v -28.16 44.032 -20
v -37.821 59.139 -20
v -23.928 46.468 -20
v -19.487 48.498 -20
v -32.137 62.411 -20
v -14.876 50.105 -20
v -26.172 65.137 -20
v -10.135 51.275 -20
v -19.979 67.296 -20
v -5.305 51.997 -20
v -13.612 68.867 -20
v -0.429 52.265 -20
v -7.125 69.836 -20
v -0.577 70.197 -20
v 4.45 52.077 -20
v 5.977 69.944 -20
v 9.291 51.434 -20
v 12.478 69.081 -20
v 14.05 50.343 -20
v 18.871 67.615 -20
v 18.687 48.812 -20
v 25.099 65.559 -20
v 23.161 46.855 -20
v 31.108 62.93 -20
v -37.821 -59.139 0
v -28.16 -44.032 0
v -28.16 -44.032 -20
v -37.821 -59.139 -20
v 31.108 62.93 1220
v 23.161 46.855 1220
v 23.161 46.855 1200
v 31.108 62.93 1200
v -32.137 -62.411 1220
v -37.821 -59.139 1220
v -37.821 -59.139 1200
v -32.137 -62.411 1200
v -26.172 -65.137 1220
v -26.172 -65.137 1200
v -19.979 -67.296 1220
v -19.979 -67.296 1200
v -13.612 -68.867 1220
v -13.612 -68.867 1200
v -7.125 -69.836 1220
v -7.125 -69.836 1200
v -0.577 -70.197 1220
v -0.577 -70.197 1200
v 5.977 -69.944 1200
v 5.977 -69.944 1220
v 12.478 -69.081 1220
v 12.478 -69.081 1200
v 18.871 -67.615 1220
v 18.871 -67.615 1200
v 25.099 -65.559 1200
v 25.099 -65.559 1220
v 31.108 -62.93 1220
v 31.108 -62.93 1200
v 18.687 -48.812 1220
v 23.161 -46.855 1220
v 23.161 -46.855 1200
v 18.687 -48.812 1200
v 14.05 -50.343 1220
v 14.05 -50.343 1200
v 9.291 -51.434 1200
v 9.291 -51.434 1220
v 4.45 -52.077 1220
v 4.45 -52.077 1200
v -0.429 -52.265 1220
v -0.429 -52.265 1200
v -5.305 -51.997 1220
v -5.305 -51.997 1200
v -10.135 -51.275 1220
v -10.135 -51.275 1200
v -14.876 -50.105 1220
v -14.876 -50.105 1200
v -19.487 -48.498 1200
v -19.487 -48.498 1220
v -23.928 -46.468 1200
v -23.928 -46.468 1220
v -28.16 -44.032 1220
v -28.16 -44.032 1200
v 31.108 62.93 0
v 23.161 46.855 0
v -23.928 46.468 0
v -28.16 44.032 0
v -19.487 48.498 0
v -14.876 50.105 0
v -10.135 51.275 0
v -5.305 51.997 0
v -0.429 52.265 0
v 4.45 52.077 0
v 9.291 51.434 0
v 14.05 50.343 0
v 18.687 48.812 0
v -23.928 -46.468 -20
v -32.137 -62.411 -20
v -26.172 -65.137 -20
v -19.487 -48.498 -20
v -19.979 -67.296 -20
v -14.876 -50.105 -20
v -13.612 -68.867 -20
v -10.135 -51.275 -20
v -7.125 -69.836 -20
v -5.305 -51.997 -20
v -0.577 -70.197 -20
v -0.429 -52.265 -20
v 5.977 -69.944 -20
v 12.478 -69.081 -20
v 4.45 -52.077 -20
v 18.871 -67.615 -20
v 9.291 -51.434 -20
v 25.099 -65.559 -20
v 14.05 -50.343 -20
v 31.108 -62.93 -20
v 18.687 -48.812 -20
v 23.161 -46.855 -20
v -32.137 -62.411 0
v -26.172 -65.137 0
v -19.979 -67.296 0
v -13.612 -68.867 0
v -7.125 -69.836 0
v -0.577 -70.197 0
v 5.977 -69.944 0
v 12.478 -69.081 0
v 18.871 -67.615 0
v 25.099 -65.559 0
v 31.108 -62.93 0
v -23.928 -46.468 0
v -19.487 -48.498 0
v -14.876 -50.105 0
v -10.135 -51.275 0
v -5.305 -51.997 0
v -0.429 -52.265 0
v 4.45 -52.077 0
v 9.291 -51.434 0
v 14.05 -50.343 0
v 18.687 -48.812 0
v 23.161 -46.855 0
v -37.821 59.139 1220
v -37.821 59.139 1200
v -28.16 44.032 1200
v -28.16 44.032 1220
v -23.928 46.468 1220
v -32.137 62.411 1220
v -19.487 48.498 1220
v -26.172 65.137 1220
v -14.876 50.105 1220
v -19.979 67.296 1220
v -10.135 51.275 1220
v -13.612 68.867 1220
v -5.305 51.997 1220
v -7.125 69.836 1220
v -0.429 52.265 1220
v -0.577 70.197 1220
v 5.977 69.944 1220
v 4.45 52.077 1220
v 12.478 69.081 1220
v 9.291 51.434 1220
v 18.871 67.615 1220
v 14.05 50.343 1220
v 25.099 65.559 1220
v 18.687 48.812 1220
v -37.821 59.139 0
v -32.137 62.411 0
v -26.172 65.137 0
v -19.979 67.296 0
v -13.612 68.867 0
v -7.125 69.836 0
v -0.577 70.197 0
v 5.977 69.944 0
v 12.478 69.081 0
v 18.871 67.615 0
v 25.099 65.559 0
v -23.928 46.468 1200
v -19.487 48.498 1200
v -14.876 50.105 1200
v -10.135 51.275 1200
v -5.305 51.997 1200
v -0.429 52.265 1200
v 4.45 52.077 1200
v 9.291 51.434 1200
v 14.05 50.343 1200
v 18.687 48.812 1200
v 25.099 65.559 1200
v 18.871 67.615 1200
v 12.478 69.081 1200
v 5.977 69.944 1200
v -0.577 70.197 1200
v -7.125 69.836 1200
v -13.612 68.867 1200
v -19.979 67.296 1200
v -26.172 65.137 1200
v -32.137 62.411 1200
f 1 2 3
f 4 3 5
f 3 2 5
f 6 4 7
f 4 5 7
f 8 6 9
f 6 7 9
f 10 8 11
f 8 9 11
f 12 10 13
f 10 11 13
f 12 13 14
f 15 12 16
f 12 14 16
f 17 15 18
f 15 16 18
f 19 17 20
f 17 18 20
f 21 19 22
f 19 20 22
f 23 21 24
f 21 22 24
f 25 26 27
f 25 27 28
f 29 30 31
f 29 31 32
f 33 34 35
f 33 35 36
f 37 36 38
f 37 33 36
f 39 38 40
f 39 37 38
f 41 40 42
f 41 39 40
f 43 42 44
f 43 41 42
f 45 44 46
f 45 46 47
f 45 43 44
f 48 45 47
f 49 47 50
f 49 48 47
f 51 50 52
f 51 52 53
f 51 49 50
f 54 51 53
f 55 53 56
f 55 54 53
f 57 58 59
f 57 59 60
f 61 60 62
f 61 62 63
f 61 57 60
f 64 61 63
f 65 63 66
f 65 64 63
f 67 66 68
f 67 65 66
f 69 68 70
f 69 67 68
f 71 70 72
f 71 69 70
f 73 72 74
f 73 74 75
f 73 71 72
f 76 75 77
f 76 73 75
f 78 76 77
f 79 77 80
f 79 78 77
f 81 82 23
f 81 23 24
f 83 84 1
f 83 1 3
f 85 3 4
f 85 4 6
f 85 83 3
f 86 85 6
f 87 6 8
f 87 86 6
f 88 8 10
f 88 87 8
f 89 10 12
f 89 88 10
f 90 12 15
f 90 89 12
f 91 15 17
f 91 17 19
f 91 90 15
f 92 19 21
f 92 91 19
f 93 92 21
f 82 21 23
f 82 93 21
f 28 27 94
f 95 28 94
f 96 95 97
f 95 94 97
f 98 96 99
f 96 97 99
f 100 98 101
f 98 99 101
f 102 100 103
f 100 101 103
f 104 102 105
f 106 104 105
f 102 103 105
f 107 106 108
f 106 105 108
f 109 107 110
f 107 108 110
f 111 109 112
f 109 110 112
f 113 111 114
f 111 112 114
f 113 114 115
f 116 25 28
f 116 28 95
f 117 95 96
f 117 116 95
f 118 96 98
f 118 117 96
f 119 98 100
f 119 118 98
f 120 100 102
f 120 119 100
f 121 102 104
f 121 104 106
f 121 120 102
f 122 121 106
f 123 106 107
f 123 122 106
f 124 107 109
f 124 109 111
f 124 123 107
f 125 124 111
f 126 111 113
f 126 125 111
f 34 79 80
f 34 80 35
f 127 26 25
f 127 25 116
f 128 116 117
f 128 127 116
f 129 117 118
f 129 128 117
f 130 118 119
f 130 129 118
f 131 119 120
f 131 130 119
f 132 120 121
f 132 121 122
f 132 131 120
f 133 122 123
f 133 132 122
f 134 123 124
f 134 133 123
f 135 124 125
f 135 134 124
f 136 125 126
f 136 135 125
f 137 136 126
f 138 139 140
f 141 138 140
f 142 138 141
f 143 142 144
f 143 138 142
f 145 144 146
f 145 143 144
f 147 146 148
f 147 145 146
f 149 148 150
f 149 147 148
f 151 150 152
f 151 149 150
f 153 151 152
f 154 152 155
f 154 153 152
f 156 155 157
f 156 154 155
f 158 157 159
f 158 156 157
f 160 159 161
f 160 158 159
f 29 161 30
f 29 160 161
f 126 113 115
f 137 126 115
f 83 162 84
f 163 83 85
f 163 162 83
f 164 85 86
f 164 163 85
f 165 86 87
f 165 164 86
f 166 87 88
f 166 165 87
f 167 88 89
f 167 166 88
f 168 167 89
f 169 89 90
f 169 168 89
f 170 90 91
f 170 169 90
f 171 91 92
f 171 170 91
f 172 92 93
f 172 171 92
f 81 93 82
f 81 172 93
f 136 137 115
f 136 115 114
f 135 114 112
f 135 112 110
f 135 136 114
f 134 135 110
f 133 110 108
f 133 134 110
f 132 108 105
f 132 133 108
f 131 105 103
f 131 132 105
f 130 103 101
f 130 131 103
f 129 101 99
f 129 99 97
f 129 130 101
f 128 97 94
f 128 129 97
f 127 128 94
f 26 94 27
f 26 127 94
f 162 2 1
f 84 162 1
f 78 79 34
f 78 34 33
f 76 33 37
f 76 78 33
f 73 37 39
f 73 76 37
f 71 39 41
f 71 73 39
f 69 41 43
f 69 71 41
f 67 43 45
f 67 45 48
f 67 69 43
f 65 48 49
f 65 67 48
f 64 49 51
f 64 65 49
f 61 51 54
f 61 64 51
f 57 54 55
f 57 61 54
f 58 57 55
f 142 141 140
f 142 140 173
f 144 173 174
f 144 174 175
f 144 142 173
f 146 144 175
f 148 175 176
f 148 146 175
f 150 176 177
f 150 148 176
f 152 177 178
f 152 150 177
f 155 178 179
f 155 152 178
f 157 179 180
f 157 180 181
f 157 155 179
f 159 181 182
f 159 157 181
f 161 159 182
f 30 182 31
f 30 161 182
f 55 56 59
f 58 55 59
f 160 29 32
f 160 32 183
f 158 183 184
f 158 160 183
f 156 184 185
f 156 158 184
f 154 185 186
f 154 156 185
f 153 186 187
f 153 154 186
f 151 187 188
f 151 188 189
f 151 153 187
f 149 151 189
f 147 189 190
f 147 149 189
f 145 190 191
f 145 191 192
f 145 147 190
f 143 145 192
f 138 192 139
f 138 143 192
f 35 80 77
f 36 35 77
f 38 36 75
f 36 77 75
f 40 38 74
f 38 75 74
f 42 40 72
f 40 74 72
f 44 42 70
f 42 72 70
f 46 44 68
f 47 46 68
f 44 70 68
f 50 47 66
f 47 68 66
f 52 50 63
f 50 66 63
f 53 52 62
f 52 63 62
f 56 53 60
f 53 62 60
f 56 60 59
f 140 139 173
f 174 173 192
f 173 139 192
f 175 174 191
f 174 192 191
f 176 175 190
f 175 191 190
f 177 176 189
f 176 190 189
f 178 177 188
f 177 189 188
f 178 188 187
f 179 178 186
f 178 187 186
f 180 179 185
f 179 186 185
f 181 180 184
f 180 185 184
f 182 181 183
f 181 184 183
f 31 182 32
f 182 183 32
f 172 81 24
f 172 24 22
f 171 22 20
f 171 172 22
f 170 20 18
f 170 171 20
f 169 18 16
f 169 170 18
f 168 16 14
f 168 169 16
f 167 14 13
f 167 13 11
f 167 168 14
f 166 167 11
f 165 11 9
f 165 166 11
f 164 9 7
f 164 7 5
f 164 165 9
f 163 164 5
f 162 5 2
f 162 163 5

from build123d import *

# Parameters (mm, degrees)
BOSS_EXTRUDE2_DEPTH   = 20
BOSS_EXTRUDE2_2_DEPTH = 20
LPATTERN1_COUNT       = 2
LPATTERN1_PITCH       = 1220


with BuildPart() as part:
    # Sketch2 → Boss-Extrude2 (new body)
    with BuildSketch(Plane.XY):
        with BuildLine():
            Line((-37.821455886, 59.139003749), (-28.160126305, 44.032197495))
            ThreePointArc((-28.160126305, 44.032197495), (-2.870393775, 52.188005991), (23.161241474, 46.854925281))
            Line((23.161241474, 46.854925281), (31.107526408, 62.930168366))
            ThreePointArc((31.107526408, 62.930168366), (-3.855184113, 70.092951467), (-37.821455886, 59.139003749))
        make_face()
    boss_extrude2 = extrude(amount=-BOSS_EXTRUDE2_DEPTH)


with BuildPart() as body_2:
    # Sketch2 → Boss-Extrude2 2 (new body)
    with BuildSketch(Plane.XY):
        with BuildLine():
            Line((31.107526408, -62.930168366), (23.161241474, -46.854925281))
            ThreePointArc((23.161241474, -46.854925281), (-2.870393775, -52.188005991), (-28.160126305, -44.032197495))
            Line((-28.160126305, -44.032197495), (-37.821455886, -59.139003749))
            ThreePointArc((-37.821455886, -59.139003749), (-3.855184113, -70.092951467), (31.107526408, -62.930168366))
        make_face()
    boss_extrude2_2 = extrude(amount=-BOSS_EXTRUDE2_2_DEPTH)


with BuildPart() as lpattern1_1:
    # LPattern1: Boss-Extrude2, Boss-Extrude2 2 ×2
    with Locations(*[(0, 0, i * LPATTERN1_PITCH) for i in range(1, LPATTERN1_COUNT)]):
        add(boss_extrude2)
        add(boss_extrude2_2)


solid = Compound([part.part, body_2.part, lpattern1_1.part])
